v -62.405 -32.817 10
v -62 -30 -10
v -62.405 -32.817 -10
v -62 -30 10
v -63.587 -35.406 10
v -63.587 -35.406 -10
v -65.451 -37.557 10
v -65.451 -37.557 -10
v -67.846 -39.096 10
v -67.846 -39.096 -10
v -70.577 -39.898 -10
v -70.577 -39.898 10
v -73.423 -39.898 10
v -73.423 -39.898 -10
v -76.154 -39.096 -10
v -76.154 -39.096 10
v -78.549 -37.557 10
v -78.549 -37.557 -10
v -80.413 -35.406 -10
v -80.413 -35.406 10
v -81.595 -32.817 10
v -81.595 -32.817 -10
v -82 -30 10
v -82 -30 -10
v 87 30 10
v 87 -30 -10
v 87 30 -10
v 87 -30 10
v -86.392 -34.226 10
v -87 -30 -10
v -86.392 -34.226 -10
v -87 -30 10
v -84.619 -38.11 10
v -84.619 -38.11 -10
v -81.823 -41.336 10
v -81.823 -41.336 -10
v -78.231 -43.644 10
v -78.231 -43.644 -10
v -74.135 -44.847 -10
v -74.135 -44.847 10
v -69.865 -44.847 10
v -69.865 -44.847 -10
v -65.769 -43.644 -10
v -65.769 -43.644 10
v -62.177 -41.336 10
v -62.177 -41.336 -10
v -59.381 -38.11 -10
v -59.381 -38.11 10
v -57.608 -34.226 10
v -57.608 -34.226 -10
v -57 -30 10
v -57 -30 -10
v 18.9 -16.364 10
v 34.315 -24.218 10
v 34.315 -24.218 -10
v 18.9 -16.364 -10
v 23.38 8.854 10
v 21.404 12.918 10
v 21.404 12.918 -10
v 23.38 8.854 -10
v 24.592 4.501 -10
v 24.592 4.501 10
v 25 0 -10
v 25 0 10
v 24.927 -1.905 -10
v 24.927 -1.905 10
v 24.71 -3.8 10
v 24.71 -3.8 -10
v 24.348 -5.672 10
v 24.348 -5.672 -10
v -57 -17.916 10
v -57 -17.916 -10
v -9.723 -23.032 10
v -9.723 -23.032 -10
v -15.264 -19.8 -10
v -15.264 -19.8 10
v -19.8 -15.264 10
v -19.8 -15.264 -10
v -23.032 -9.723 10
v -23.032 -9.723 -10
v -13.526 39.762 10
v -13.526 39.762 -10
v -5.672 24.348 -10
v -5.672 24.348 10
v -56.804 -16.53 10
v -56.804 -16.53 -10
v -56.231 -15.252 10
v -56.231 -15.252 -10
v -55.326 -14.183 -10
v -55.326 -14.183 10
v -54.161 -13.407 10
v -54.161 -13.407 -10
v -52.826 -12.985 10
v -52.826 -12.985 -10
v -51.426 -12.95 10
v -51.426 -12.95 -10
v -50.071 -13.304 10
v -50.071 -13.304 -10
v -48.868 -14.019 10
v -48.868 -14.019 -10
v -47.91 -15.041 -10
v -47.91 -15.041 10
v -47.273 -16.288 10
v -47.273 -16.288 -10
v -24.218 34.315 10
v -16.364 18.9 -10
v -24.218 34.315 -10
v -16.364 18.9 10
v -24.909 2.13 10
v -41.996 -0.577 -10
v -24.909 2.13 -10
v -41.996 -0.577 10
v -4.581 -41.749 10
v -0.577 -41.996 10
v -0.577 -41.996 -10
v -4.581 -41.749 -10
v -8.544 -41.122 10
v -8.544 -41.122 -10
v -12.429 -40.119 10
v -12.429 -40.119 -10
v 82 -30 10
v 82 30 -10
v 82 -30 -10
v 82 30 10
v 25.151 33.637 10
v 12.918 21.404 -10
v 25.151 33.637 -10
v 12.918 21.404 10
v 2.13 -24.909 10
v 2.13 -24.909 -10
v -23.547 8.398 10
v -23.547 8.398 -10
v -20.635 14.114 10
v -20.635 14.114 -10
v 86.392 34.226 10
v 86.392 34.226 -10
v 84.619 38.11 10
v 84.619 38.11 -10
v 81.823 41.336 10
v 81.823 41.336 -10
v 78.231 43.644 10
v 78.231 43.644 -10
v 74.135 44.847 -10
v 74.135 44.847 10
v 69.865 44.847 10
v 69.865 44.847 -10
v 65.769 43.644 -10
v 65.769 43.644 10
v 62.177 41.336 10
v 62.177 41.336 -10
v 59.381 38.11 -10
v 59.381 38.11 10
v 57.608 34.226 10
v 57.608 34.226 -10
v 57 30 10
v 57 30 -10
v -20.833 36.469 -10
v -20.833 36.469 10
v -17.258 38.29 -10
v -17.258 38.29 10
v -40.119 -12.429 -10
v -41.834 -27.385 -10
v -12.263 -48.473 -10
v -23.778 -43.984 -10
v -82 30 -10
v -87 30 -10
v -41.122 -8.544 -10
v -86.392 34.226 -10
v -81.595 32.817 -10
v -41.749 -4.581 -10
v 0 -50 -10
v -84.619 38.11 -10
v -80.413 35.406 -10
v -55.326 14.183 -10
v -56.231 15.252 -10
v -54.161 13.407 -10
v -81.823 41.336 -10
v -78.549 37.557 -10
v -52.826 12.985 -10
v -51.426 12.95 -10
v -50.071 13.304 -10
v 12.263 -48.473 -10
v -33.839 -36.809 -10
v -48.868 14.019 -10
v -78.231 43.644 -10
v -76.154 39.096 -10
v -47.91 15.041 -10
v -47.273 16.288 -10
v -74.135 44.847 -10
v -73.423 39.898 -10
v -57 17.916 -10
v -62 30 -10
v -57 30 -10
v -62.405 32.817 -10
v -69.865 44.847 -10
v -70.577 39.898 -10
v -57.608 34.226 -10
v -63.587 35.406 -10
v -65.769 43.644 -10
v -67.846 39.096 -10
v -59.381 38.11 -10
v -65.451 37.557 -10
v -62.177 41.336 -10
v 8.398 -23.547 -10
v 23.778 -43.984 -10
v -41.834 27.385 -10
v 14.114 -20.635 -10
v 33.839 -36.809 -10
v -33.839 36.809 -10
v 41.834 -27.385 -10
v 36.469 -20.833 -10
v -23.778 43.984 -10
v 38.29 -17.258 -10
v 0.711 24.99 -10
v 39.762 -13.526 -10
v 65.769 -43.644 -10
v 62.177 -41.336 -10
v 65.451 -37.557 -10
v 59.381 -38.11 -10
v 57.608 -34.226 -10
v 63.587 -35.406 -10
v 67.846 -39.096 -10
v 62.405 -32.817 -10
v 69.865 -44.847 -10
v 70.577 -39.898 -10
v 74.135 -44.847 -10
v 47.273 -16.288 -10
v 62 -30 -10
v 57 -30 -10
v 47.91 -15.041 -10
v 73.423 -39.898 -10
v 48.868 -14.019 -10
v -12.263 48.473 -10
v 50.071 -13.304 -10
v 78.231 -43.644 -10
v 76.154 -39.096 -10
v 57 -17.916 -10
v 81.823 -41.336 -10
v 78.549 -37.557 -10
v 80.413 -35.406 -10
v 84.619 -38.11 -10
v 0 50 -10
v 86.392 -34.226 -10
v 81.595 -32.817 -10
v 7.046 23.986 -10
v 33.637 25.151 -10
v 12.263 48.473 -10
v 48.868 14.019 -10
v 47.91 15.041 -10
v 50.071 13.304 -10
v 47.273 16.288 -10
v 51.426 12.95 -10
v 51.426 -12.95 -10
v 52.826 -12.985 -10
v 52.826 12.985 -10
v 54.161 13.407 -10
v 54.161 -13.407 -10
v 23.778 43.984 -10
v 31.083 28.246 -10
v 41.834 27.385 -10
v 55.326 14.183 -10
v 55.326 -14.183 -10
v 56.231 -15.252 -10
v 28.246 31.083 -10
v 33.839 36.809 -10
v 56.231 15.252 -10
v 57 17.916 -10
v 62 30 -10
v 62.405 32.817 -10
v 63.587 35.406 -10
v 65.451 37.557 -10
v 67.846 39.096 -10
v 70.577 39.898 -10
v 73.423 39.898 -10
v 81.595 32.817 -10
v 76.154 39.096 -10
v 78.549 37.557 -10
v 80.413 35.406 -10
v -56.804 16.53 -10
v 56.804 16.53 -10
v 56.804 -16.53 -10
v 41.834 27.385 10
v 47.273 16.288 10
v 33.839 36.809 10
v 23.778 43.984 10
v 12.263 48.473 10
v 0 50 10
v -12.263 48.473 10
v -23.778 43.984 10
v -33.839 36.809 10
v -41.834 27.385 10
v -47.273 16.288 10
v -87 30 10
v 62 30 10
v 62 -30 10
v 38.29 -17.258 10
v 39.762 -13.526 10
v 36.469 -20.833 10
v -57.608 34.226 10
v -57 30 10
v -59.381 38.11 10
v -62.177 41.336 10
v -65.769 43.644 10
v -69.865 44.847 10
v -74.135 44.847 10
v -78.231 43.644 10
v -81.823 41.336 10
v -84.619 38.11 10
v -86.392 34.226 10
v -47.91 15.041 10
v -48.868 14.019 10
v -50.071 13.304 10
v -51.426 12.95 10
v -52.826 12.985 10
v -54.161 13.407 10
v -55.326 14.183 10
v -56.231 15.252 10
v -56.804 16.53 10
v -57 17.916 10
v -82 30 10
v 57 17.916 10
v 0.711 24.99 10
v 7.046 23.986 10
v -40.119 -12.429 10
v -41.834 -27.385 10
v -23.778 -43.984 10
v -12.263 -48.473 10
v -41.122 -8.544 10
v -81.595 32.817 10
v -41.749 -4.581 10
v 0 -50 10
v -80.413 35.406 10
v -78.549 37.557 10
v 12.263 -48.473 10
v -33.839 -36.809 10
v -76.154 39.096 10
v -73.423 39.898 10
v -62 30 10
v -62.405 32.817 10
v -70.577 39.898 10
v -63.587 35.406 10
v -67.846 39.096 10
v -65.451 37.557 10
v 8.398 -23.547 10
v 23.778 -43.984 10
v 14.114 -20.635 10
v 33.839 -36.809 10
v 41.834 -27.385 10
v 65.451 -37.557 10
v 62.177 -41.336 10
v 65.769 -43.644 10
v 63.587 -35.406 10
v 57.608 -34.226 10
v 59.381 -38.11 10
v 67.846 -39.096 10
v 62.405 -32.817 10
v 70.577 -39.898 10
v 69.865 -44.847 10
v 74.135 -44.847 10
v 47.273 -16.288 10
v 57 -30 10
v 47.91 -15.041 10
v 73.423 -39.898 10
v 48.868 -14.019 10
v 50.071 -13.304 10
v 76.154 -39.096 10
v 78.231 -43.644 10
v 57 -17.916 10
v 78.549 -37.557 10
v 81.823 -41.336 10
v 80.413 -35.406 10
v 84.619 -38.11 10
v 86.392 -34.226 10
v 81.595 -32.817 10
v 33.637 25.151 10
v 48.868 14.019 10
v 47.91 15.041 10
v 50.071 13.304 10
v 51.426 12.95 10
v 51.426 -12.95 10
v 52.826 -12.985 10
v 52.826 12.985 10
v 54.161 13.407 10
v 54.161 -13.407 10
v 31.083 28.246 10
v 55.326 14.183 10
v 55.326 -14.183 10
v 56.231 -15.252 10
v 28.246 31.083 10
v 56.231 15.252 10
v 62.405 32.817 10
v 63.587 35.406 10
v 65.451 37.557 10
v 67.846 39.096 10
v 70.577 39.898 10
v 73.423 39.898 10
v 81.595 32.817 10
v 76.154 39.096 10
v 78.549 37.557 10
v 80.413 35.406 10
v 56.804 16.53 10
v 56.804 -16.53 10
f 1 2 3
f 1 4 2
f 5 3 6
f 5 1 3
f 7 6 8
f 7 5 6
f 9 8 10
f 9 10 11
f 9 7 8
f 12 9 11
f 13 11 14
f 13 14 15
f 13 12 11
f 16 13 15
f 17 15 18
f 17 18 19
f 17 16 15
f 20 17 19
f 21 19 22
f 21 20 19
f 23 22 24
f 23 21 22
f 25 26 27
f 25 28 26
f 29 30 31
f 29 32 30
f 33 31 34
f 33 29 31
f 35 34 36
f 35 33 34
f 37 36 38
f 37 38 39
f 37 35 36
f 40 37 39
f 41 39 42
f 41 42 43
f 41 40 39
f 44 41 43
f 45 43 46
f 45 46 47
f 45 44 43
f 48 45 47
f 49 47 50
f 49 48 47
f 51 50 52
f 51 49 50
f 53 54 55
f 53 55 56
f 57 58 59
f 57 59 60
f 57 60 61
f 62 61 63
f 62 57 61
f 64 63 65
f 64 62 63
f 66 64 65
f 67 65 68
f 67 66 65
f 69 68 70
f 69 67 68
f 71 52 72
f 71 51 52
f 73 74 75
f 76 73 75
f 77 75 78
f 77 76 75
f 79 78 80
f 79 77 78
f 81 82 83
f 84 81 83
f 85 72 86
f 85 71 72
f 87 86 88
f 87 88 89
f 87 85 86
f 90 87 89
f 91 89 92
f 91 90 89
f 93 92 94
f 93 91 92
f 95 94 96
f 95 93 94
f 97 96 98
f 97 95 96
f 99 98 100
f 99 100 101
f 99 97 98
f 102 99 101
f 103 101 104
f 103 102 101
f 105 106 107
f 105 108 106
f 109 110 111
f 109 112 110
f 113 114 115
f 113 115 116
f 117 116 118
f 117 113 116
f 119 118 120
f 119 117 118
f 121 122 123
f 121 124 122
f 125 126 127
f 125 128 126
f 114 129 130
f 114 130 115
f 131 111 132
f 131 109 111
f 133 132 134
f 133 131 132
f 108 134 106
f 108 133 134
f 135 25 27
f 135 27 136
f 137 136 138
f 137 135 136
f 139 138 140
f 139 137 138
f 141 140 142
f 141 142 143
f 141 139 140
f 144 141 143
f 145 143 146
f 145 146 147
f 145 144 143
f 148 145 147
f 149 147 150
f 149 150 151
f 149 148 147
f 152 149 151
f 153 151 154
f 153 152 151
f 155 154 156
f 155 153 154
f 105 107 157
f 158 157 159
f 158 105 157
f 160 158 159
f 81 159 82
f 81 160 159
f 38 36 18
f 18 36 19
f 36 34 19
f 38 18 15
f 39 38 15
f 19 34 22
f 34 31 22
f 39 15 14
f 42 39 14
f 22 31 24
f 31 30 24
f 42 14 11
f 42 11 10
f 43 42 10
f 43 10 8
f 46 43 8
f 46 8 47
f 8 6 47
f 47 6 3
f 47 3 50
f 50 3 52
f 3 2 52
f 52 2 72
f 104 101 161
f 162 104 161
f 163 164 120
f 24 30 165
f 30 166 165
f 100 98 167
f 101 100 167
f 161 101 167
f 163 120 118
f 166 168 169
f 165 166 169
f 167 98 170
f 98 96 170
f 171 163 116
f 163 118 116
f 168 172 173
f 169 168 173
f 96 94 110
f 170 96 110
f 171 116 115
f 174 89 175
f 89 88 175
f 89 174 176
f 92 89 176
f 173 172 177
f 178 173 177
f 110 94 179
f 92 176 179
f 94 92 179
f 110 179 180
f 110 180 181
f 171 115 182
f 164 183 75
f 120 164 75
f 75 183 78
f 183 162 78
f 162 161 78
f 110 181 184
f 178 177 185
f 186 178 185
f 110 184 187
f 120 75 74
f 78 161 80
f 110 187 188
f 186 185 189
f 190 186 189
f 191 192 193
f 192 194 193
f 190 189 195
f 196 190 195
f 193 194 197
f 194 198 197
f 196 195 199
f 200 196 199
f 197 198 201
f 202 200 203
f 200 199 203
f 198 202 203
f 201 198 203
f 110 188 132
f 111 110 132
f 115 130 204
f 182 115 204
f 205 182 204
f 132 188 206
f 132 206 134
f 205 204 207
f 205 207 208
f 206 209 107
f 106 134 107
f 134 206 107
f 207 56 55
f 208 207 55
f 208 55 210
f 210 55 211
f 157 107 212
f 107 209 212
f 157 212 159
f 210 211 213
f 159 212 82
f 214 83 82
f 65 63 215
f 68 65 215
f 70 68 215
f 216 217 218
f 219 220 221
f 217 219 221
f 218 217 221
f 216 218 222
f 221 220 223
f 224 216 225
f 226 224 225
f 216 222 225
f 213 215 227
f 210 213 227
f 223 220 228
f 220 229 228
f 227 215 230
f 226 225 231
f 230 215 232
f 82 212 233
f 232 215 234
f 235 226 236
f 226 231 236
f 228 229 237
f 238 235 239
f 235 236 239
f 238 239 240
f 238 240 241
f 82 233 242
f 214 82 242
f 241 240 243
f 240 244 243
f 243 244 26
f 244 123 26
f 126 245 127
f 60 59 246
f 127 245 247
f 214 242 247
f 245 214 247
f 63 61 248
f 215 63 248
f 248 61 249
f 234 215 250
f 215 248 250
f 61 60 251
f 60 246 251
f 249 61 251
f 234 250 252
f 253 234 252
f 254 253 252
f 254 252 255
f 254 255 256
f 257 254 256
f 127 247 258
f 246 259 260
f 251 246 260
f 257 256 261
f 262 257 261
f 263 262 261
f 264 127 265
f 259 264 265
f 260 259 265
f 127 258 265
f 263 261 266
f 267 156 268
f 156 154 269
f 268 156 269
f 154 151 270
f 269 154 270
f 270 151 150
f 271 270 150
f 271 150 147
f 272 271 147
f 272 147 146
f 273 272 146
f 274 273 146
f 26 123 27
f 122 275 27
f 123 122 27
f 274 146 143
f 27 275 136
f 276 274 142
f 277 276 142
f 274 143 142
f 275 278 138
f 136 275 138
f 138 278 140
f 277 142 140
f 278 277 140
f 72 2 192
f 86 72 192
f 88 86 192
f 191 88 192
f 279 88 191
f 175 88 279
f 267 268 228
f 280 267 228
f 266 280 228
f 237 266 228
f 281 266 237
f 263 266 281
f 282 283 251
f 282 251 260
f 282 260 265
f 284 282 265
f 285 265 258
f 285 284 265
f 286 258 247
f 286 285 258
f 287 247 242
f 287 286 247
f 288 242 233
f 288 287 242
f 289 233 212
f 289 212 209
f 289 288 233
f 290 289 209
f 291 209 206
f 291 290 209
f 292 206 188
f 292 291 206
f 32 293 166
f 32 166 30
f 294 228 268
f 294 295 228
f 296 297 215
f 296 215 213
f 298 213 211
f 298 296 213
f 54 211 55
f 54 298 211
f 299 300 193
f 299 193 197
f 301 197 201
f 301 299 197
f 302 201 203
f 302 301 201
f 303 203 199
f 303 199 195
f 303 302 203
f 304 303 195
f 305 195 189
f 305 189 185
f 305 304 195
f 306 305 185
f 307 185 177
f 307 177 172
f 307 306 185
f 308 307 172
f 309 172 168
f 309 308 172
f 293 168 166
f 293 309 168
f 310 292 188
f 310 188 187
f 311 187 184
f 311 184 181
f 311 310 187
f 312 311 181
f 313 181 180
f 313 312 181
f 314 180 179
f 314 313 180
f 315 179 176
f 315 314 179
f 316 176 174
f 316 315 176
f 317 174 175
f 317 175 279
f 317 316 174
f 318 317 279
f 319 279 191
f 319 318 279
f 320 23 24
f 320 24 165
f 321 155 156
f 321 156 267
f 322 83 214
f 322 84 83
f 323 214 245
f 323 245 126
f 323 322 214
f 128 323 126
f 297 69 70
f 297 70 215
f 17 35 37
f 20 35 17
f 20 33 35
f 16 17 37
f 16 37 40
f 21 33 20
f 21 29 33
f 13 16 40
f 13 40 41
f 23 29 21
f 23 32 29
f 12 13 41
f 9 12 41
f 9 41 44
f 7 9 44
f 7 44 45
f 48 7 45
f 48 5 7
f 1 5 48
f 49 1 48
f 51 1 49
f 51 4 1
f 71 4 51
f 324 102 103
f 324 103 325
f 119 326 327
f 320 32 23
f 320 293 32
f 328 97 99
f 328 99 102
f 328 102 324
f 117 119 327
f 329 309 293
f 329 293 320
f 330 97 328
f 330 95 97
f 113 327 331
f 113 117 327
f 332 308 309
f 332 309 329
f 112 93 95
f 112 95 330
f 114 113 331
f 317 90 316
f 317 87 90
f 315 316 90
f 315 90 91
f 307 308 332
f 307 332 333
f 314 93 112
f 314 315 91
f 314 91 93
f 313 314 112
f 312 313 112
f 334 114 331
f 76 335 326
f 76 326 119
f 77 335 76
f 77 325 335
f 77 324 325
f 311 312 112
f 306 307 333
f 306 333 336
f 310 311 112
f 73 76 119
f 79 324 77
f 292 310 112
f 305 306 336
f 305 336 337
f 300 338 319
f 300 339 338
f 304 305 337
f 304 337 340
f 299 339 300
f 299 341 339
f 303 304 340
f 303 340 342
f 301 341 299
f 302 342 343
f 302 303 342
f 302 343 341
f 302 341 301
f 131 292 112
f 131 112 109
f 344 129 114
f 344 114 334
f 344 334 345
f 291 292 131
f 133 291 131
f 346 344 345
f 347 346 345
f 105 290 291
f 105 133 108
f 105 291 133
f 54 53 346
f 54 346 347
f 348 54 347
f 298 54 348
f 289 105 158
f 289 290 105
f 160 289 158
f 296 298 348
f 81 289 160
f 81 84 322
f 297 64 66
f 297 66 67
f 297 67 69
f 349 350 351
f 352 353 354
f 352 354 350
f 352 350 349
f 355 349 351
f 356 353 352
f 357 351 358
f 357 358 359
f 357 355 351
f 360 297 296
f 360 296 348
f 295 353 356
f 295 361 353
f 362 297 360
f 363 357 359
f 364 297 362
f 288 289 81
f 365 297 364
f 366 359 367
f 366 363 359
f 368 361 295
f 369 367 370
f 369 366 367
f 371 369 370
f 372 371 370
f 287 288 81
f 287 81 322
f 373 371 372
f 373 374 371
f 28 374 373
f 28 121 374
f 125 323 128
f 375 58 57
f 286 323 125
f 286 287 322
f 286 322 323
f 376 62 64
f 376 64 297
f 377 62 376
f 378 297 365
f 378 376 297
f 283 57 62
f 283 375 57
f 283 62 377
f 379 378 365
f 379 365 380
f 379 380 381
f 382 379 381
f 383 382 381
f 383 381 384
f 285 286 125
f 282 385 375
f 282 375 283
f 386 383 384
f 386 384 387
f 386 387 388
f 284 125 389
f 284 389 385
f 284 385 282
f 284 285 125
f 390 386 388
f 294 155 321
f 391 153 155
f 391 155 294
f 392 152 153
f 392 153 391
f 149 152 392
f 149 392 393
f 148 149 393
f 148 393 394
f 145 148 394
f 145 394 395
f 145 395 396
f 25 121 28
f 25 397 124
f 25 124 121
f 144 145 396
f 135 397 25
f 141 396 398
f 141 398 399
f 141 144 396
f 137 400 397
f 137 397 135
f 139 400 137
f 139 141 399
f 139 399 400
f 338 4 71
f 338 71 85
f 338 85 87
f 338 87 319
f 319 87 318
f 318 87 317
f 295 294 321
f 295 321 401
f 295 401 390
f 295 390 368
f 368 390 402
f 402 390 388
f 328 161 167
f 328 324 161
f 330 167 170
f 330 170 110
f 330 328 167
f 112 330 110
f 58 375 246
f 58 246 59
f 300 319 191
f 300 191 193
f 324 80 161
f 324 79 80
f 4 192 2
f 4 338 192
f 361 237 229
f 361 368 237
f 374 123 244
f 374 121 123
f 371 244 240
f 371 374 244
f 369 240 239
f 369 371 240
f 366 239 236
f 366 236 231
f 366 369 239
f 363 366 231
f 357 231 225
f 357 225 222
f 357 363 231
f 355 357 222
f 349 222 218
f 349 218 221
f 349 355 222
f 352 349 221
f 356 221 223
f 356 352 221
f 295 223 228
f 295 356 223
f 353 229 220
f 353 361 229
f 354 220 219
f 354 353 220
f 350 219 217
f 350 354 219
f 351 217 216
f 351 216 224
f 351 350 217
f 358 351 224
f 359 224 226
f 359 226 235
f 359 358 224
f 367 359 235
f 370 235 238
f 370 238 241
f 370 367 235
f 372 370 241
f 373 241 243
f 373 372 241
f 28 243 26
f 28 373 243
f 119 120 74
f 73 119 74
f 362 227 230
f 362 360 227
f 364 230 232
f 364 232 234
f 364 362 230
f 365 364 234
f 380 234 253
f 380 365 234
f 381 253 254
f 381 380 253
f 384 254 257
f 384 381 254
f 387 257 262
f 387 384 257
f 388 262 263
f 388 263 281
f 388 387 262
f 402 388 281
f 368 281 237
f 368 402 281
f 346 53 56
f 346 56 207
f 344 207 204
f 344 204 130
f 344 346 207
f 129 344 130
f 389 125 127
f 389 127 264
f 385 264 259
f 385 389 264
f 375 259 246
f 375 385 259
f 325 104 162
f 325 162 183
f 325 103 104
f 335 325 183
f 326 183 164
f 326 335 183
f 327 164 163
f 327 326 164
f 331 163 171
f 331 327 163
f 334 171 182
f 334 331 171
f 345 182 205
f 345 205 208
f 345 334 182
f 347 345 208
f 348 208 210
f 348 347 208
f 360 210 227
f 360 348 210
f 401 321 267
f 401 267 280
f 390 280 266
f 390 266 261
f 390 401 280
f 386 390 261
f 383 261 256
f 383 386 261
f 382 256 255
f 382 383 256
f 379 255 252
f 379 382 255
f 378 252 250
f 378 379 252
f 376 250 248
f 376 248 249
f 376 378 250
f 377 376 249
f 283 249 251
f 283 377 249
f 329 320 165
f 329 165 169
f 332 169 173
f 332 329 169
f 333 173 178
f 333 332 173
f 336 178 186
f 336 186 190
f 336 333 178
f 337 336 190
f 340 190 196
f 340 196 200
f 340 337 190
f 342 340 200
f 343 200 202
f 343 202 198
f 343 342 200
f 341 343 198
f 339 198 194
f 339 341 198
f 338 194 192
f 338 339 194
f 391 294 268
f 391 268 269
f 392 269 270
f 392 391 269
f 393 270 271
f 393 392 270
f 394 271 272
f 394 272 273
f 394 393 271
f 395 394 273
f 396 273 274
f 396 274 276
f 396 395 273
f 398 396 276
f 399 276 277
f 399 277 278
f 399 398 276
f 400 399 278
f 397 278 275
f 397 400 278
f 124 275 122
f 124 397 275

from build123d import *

# Parameters (mm, degrees)
BOSS_EXTRUDE1_DEPTH = 10


with BuildPart() as part:
    # Sketch1 → Boss-Extrude1 (new, symmetric)
    with BuildSketch(Plane.XY):
        with BuildLine():
            Line((87, -30), (87, 30))
            ThreePointArc((87, 30), (72, 45), (57, 30))
            Line((57, 30), (57, 17.916472867))
            ThreePointArc((57, 17.916472867), (52.825722824, 12.985126011), (47.272727273, 16.287702607))
            ThreePointArc((47.272727273, 16.287702607), (0, 50), (-47.272727273, 16.287702607))
            ThreePointArc((-47.272727273, 16.287702607), (-52.825722824, 12.985126011), (-57, 17.916472867))
            Line((-57, 17.916472867), (-57, 30))
            ThreePointArc((-57, 30), (-72, 45), (-87, 30))
            Line((-87, 30), (-87, -30))
            ThreePointArc((-87, -30), (-72, -45), (-57, -30))
            Line((-57, -30), (-57, -17.916472867))
            ThreePointArc((-57, -17.916472867), (-52.825722824, -12.985126011), (-47.272727273, -16.287702607))
            ThreePointArc((-47.272727273, -16.287702607), (0, -50), (47.272727273, -16.287702607))
            ThreePointArc((47.272727273, -16.287702607), (52.825722824, -12.985126011), (57, -17.916472867))
            Line((57, -17.916472867), (57, -30))
            ThreePointArc((57, -30), (72, -45), (87, -30))
        make_face()
        with BuildLine():
            ThreePointArc((25.151236226, 33.636517601), (29.69848481, 29.69848481), (33.636517601, 25.151236226))
            Line((33.636517601, 25.151236226), (21.403642989, 12.918361615))
            ThreePointArc((21.403642989, 12.918361615), (24.084134557, 6.704808919), (25, 0))
            ThreePointArc((25, 0), (24.836482092, -2.85467289), (24.348067415, -5.672002568))
            Line((24.348067415, -5.672002568), (39.762388673, -13.525991536))
            ThreePointArc((39.762388673, -13.525991536), (37.422274016, -19.067600989), (34.314502676, -24.218069826))
            Line((34.314502676, -24.218069826), (18.900181419, -16.364080859))
            ThreePointArc((18.900181419, -16.364080859), (11.349762493, -22.275163105), (2.129571608, -24.90913336))
            Line((2.129571608, -24.90913336), (-0.576728553, -41.996040101))
            ThreePointArc((-0.576728553, -41.996040101), (-6.570247532, -41.482910305), (-12.42898864, -40.118826521))
            Line((-12.42898864, -40.118826521), (-9.722688479, -23.03191978))
            ThreePointArc((-9.722688479, -23.03191978), (-17.67766953, -17.67766953), (-23.03191978, -9.722688479))
            Line((-23.03191978, -9.722688479), (-40.118826521, -12.42898864))
            ThreePointArc((-40.118826521, -12.42898864), (-41.482910305, -6.570247532), (-41.996040101, -0.576728553))
            Line((-41.996040101, -0.576728553), (-24.90913336, 2.129571608))
            ThreePointArc((-24.90913336, 2.129571608), (-22.275163105, 11.349762493), (-16.364080859, 18.900181419))
            Line((-16.364080859, 18.900181419), (-24.218069826, 34.314502676))
            ThreePointArc((-24.218069826, 34.314502676), (-19.067600989, 37.422274016), (-13.525991536, 39.762388673))
            Line((-13.525991536, 39.762388673), (-5.672002568, 24.348067415))
            ThreePointArc((-5.672002568, 24.348067415), (3.910861626, 24.692208515), (12.918361615, 21.403642989))
            Line((12.918361615, 21.403642989), (25.151236226, 33.636517601))
        make_face(mode=Mode.SUBTRACT)
        with BuildLine():
            Line((-82, -30), (-82, 30))
            ThreePointArc((-82, 30), (-72, 40), (-62, 30))
            Line((-62, 30), (-62, -30))
            ThreePointArc((-62, -30), (-72, -40), (-82, -30))
        make_face(mode=Mode.SUBTRACT)
        with BuildLine():
            ThreePointArc((62, 30), (72, 40), (82, 30))
            Line((82, 30), (82, -30))
            ThreePointArc((82, -30), (72, -40), (62, -30))
            Line((62, -30), (62, 30))
        make_face(mode=Mode.SUBTRACT)
    extrude(amount=BOSS_EXTRUDE1_DEPTH, both=True)


solid = part.part
